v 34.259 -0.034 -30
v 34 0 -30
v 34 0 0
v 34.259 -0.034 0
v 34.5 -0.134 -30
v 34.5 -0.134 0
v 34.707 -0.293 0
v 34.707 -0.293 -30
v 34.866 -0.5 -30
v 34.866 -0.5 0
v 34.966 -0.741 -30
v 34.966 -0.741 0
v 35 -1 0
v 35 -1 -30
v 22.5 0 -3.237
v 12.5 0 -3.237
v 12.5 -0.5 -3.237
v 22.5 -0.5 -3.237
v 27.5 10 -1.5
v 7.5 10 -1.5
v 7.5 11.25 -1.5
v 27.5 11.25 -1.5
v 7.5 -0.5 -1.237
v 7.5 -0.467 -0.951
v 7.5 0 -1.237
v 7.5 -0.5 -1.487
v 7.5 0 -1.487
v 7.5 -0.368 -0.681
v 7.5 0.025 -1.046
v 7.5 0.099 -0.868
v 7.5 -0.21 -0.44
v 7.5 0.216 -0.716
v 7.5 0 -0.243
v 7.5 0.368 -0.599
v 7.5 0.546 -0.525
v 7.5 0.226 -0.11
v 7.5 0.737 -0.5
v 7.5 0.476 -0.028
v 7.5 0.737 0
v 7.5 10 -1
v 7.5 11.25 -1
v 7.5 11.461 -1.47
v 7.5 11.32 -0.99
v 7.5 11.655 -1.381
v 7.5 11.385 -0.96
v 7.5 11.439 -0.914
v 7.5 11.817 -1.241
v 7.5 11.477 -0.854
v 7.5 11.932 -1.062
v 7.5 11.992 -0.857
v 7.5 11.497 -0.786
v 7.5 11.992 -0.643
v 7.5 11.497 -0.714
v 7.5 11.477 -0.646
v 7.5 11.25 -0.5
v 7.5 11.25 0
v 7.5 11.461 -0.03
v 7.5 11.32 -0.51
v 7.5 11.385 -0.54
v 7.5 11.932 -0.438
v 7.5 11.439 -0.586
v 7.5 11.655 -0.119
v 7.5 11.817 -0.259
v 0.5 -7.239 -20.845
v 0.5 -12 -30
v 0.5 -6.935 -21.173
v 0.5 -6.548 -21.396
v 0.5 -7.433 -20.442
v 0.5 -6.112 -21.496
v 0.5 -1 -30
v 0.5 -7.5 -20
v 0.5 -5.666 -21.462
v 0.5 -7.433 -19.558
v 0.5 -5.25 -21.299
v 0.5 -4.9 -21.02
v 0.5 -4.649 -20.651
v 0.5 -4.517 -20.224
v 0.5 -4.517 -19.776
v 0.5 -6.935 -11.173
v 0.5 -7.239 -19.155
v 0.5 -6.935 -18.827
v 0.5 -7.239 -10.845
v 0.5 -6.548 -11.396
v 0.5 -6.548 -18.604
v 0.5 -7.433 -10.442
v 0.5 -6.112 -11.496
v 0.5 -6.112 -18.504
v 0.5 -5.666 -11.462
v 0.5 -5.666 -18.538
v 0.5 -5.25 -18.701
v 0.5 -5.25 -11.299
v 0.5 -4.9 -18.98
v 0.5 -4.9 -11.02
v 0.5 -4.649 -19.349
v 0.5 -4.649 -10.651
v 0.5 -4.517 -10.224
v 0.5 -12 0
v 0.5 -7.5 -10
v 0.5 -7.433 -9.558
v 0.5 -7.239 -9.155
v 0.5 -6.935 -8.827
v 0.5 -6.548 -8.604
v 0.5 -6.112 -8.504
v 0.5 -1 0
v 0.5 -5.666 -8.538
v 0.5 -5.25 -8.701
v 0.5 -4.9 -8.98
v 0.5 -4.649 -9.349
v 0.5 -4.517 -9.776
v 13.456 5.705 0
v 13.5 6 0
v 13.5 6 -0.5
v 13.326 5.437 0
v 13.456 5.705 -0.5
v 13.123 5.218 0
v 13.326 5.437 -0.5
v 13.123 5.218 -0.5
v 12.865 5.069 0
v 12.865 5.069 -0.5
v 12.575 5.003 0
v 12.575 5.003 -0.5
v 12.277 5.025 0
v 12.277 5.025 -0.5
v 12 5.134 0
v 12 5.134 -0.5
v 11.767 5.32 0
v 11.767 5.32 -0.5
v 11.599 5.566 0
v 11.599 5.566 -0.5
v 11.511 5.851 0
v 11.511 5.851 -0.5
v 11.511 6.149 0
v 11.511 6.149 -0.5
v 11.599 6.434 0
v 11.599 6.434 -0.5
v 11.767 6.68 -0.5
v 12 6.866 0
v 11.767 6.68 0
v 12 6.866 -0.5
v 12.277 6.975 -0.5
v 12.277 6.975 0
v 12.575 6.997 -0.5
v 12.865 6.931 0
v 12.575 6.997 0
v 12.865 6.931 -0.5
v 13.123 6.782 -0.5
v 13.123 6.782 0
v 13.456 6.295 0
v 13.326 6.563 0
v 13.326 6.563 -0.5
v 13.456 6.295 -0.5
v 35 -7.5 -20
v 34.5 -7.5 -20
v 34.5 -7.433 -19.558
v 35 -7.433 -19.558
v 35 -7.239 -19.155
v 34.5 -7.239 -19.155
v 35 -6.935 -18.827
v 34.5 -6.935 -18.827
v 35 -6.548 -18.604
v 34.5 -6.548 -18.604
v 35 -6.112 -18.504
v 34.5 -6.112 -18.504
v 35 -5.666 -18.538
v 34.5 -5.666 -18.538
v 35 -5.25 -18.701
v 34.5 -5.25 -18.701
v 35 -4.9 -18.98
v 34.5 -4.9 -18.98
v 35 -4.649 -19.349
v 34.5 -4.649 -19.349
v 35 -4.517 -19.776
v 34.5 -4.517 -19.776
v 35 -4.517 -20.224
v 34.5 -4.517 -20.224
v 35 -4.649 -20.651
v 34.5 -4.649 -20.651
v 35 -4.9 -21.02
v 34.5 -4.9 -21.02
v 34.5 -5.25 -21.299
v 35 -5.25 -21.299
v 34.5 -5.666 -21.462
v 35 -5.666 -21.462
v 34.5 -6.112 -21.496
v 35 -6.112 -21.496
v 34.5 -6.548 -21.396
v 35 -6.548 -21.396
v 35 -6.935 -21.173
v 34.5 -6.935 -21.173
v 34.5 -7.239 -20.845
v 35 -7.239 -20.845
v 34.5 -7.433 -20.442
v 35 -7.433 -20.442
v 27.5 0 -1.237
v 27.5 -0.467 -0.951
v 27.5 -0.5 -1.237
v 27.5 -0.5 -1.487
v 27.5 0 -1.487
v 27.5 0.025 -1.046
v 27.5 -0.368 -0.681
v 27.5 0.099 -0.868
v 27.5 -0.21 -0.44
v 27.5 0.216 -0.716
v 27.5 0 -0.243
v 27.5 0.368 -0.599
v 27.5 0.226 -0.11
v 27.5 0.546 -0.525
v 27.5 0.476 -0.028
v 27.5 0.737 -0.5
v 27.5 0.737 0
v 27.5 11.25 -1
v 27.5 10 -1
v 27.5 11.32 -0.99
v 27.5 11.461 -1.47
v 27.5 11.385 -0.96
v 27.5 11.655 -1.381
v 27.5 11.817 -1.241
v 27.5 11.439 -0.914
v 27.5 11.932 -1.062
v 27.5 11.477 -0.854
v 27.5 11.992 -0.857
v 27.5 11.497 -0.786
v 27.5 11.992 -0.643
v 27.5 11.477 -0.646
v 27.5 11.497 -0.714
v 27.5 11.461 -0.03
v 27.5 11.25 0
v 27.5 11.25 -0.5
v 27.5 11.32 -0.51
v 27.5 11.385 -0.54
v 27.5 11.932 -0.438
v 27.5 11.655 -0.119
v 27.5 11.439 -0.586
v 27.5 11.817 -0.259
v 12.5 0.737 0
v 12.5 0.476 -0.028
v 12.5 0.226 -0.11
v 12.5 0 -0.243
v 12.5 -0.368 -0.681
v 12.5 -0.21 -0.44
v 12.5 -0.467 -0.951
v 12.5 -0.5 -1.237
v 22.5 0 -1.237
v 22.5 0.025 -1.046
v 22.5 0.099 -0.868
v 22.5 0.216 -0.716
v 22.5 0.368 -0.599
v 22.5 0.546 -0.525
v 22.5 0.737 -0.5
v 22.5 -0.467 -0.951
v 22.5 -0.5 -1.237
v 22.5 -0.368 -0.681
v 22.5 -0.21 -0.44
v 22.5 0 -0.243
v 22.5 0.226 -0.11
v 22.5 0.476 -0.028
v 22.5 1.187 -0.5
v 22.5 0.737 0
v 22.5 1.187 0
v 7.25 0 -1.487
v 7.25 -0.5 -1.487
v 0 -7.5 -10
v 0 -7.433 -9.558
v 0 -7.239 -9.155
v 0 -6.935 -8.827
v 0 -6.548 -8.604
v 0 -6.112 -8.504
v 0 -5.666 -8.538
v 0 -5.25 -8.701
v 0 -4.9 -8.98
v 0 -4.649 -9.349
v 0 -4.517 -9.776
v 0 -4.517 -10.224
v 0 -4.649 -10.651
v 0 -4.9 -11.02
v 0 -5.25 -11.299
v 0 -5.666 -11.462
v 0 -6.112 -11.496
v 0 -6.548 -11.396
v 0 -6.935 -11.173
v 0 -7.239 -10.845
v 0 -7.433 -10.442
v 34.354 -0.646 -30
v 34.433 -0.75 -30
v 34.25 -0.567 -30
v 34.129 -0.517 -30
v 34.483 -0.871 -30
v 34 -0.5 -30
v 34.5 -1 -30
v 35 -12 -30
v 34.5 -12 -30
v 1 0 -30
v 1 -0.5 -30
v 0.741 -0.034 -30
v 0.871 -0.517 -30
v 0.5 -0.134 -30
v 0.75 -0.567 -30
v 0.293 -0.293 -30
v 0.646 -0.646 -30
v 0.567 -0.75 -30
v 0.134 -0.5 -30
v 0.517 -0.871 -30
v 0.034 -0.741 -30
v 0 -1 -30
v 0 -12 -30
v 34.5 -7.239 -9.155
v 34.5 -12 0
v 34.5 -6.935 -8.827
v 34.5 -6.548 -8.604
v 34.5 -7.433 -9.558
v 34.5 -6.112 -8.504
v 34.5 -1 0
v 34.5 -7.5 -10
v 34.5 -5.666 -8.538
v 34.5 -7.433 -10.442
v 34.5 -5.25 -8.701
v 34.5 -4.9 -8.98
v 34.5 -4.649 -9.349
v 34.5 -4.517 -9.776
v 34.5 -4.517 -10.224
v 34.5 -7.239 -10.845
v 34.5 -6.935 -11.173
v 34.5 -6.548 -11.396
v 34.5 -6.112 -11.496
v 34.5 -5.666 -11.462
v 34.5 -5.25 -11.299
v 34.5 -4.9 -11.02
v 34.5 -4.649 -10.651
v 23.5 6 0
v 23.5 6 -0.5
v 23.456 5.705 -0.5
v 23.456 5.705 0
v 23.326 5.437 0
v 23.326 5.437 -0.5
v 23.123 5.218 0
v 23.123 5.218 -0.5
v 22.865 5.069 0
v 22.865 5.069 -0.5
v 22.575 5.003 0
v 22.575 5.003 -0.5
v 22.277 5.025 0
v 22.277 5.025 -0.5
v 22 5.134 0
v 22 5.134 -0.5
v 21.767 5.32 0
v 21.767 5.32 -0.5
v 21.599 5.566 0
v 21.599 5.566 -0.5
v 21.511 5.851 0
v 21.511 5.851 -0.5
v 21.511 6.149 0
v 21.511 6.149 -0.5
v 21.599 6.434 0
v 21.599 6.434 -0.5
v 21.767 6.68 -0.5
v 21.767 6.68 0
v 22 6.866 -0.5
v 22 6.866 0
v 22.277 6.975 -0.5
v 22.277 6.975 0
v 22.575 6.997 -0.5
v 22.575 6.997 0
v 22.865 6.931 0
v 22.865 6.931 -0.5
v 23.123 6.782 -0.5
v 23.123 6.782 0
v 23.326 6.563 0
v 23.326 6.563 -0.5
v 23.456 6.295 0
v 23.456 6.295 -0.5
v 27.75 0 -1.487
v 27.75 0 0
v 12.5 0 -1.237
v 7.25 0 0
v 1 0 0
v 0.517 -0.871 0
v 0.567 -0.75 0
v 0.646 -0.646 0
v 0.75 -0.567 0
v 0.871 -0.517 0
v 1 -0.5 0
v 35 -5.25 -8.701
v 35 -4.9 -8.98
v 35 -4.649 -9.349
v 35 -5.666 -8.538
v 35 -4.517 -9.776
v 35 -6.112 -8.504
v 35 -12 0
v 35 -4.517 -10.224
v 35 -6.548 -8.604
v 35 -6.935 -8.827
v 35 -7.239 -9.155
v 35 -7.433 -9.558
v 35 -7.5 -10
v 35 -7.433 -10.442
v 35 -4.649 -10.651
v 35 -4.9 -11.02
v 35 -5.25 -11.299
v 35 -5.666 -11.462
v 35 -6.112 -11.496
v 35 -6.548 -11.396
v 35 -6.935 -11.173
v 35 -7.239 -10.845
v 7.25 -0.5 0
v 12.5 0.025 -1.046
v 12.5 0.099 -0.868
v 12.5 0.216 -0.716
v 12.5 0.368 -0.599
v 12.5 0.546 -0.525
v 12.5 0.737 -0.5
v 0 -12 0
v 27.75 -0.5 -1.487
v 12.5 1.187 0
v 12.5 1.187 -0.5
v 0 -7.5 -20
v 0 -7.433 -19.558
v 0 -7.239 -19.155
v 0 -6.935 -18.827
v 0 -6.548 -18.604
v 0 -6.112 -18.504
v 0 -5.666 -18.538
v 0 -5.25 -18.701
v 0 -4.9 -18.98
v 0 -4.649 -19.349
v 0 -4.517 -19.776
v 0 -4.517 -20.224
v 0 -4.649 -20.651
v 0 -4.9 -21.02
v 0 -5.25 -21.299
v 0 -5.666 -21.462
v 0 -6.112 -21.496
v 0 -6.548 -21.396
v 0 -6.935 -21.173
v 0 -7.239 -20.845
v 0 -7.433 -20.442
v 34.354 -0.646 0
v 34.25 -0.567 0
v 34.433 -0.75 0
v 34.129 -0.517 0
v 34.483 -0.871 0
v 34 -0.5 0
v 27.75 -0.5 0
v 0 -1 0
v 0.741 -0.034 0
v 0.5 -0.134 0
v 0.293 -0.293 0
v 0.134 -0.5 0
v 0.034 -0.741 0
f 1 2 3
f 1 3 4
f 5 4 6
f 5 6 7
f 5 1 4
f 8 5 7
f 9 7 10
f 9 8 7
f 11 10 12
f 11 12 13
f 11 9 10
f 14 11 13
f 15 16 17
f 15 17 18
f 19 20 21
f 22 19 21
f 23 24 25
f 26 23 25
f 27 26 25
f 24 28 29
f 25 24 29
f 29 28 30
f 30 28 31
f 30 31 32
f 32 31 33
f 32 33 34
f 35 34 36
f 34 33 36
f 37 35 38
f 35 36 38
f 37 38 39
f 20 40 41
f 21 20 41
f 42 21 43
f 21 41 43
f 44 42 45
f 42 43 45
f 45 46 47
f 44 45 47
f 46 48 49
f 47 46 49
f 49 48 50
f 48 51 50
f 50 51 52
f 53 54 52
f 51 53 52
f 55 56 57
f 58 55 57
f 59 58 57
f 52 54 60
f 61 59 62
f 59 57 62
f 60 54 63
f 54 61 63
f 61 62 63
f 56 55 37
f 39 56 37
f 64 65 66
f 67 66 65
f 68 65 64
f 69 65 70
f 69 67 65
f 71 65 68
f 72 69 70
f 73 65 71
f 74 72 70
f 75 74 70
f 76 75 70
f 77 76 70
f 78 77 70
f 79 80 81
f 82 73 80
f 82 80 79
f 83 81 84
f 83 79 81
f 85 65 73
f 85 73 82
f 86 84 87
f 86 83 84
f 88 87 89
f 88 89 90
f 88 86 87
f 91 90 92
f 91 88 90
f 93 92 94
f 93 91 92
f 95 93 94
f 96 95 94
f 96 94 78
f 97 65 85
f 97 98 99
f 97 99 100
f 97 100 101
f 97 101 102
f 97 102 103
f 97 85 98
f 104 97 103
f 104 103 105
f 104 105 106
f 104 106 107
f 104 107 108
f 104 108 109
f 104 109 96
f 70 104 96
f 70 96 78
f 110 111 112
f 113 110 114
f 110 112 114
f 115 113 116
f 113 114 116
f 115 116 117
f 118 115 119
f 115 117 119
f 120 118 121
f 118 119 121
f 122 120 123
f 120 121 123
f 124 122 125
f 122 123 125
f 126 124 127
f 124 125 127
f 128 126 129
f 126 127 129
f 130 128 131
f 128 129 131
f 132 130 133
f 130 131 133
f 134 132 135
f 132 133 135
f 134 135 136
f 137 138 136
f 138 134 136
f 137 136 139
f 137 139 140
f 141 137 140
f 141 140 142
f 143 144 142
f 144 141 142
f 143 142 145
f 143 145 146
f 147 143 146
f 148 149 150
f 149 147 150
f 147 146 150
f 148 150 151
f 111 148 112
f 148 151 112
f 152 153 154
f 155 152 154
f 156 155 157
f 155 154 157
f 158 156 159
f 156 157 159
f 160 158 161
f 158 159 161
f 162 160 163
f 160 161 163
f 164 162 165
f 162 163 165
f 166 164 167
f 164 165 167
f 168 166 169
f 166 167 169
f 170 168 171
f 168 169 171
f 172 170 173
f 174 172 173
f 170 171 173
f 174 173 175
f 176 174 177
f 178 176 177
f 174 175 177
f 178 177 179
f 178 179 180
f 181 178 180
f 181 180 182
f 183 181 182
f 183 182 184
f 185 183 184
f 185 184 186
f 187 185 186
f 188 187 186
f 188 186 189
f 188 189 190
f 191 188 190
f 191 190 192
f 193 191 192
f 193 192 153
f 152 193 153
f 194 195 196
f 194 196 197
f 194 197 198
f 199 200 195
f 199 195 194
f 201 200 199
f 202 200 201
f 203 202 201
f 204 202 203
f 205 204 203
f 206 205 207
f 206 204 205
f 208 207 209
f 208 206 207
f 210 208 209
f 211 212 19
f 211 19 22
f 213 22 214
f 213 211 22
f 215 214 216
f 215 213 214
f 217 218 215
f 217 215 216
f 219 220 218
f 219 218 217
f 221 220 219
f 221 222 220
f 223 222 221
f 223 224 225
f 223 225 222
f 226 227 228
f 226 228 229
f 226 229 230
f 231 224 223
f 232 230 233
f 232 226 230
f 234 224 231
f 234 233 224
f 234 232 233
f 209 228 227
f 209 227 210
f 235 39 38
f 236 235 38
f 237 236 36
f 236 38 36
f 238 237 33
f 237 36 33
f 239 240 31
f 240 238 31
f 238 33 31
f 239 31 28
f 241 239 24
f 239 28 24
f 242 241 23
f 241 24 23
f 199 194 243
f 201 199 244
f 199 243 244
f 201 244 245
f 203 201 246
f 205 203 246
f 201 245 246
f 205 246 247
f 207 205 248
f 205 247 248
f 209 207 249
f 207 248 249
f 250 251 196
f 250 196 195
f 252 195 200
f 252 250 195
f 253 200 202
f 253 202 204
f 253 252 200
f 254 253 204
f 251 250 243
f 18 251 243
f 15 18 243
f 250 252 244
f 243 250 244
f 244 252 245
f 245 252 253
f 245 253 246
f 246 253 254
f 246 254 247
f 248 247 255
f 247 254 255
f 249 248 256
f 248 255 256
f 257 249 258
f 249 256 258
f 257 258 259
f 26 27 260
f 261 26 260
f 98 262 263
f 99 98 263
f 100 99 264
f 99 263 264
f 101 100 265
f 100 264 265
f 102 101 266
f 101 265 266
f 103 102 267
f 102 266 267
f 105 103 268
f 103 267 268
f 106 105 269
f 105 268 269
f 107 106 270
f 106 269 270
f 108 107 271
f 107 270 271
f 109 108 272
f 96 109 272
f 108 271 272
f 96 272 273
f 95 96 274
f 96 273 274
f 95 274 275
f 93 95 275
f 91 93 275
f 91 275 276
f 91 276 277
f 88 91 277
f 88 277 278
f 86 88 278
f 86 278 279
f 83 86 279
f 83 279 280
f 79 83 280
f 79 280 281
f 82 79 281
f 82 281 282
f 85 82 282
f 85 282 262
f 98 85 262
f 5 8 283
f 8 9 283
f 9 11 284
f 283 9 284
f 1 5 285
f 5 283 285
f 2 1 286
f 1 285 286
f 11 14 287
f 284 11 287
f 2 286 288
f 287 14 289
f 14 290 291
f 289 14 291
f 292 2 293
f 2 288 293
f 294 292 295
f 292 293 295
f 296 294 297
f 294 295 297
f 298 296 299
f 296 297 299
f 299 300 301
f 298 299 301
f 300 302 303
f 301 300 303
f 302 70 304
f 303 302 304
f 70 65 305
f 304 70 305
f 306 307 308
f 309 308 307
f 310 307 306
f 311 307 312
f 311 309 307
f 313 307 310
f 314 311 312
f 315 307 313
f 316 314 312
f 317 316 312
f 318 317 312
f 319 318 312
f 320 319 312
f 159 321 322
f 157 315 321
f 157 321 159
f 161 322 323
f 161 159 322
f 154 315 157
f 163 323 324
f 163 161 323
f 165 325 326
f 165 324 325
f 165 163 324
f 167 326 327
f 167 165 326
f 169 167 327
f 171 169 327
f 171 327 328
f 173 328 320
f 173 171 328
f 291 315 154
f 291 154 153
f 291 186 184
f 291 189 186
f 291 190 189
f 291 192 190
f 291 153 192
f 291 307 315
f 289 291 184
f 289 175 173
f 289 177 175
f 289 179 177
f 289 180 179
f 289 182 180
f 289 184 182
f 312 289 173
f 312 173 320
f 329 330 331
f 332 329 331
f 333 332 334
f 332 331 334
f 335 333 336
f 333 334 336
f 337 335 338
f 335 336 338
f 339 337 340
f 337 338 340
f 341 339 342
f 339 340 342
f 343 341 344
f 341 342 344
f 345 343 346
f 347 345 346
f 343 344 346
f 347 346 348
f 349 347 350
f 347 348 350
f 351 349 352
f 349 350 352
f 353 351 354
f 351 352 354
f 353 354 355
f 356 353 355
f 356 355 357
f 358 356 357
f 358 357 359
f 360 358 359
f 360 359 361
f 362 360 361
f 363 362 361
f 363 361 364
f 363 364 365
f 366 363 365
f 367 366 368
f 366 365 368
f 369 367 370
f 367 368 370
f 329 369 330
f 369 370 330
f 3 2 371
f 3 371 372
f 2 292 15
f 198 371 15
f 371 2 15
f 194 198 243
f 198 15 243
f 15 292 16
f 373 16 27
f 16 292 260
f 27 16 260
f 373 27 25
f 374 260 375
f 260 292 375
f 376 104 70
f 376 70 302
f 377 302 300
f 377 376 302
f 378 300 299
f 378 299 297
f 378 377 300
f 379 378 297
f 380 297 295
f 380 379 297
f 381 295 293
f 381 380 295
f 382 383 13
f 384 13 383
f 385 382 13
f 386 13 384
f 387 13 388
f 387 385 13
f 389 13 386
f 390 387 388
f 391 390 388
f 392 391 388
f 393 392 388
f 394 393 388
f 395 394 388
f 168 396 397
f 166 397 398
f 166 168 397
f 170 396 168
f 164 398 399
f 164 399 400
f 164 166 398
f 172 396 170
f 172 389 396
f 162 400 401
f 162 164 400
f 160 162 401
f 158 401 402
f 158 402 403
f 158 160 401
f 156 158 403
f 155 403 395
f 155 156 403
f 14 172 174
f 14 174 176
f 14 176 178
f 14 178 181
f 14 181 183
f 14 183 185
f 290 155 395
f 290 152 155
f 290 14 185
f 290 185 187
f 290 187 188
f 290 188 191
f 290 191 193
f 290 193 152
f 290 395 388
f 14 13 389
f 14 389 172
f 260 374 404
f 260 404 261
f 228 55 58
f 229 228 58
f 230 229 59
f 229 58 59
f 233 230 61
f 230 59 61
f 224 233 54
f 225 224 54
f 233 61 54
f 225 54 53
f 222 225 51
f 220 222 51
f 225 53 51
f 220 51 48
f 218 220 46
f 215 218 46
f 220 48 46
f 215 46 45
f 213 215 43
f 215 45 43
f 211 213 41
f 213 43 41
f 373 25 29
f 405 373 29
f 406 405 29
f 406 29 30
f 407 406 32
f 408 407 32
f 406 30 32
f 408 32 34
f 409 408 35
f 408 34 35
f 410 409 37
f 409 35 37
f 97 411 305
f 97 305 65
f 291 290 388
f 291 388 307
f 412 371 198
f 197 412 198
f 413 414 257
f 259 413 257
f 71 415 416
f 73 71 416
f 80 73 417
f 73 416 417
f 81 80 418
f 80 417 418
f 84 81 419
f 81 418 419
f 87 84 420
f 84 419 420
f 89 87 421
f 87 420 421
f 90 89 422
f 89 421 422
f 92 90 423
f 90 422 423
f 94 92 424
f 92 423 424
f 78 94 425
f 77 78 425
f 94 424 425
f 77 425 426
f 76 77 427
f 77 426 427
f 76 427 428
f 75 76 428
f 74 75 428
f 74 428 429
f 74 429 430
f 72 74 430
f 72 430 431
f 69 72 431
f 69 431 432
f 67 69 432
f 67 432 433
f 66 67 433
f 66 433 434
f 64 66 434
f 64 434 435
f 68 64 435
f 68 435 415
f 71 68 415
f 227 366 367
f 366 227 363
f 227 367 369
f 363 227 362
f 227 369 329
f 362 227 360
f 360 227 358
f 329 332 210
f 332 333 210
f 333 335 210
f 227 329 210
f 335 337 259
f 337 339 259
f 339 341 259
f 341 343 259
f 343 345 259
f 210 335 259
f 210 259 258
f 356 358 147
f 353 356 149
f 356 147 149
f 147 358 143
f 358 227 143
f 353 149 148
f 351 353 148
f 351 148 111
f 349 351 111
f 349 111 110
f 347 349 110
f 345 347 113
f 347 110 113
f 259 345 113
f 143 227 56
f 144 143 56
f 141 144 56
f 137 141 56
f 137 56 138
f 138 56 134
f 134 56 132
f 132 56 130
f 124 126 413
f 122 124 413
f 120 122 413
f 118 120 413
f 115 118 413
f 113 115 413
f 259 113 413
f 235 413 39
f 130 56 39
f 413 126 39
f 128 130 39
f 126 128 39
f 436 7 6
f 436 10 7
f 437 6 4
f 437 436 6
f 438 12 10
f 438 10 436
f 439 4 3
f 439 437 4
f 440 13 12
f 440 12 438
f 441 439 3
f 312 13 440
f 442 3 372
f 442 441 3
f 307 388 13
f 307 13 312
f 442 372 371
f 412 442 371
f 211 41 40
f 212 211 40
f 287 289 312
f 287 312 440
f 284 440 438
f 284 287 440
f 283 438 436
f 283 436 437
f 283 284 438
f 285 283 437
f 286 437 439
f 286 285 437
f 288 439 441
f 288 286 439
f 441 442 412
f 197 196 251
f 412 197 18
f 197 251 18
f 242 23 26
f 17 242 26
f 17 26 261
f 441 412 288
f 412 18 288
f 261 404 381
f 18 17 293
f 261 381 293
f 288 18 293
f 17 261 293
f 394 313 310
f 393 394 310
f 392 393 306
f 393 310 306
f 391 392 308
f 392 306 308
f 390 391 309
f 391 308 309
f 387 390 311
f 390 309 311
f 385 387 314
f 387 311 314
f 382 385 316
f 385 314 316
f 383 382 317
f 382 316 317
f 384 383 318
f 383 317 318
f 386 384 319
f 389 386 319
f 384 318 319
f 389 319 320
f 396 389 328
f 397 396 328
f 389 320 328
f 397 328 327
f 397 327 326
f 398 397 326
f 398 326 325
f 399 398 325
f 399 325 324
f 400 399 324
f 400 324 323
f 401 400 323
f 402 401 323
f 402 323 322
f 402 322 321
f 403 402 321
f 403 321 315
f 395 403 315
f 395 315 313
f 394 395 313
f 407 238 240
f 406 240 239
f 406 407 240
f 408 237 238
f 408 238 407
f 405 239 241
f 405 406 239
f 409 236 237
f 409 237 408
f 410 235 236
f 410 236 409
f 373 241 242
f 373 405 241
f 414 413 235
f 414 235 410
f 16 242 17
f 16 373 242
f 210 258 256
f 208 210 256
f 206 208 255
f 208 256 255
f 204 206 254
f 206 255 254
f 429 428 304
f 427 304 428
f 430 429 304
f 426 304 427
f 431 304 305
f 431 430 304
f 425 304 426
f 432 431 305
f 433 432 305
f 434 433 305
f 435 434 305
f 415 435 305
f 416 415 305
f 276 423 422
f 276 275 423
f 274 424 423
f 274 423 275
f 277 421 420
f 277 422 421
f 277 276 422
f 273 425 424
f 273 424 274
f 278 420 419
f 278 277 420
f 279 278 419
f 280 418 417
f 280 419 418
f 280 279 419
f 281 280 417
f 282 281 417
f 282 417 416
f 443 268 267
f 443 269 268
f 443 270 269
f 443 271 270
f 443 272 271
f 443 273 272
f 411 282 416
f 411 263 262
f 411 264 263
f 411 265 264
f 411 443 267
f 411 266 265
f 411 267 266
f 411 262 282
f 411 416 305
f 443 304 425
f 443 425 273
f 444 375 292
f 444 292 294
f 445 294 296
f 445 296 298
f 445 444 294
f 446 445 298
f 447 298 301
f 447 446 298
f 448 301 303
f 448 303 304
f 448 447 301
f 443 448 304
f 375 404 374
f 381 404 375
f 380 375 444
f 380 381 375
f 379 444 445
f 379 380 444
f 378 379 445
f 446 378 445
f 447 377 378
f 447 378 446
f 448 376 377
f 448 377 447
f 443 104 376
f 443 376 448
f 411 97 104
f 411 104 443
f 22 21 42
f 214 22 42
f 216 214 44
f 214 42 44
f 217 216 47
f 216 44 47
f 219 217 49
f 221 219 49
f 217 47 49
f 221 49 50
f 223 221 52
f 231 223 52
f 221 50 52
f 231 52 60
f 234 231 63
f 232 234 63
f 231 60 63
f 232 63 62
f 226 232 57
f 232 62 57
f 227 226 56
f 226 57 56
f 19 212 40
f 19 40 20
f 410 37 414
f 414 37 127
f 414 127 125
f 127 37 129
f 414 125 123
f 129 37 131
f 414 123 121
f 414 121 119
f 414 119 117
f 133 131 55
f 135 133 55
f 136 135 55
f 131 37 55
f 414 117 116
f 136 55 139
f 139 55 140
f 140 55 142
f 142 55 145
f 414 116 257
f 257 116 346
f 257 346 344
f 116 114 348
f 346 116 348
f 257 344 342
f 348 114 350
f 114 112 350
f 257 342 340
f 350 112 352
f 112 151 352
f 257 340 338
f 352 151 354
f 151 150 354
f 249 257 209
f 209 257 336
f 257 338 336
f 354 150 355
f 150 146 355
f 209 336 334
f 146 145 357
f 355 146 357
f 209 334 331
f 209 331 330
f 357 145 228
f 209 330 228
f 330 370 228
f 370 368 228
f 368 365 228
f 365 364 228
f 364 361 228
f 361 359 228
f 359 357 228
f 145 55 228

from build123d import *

# Parameters (mm, degrees)
SKETCH1_W                     = 35
SKETCH1_H                     = 30
BASE_FLANGE1_DEPTH            = 0.5
EDGE_FLANGE1_STRIP_W          = 3
EDGE_FLANGE1_STRIP_H          = 0.5
EDGE_FLANGE1_STRIP_CUT_DEPTH  = 30
EDGE_FLANGE1_DEPTH            = 30
EDGE_FLANGE2_STRIP_W          = 3
EDGE_FLANGE2_STRIP_H          = 0.5
EDGE_FLANGE2_STRIP_CUT_DEPTH  = 30
EDGE_FLANGE2_DEPTH            = 30
SKETCH12_R                    = 1.5
CUT_EXTRUDE1_DEPTH            = 40
EDGE_FLANGE4_STRIP_W          = 3.4732
EDGE_FLANGE4_STRIP_H          = 0.5
EDGE_FLANGE4_STRIP_CUT_DEPTH  = 20
EDGE_FLANGE4_RELIEF_W         = 3.7232
EDGE_FLANGE4_RELIEF_H         = 0.25
EDGE_FLANGE4_RELIEF_CUT_DEPTH = 0.5
EDGE_FLANGE4_DEPTH            = 20
SKETCH25_R                    = 1
CUT_EXTRUDE2_DEPTH            = 0.5
HEM1_START                    = 7.5
HEM1_DEPTH                    = 20
HEM1_2_DEPTH                  = 20
UNFOLD1_OUTLINE_W             = 20
UNFOLD1_OUTLINE_H             = 1.5
UNFOLD1_DEPTH                 = 13
UNFOLD1_START                 = -0.5
UNFOLD1_2_OUTLINE_W           = 20
UNFOLD1_2_OUTLINE_H           = 11.076547656
UNFOLD1_2_OUTLINE_R           = 1
UNFOLD1_2_DEPTH               = 0.5
UNFOLD1_START_2               = 7.5
UNFOLD1_3_DEPTH               = 20
SKETCH30_W                    = 10
SKETCH30_H                    = 4
CUT_EXTRUDE3_DEPTH            = 0.5
FOLD1_START                   = 7.5
FOLD1_DEPTH                   = 20
FOLD1_START_2                 = 13.5000001
FOLD1_2_DEPTH                 = 7.9999998
FOLD1_3_DEPTH                 = 3.9999999
FOLD1_START_3                 = 23.5000001
FOLD1_4_DEPTH                 = 3.9999999
FOLD1_5_DEPTH                 = 5
FOLD1_START_4                 = 22.5
FOLD1_6_DEPTH                 = 5
FOLD1_START_5                 = -0.5
FOLD1_7_DEPTH                 = 0.5
FOLD1_START_6                 = 11.4999999
FOLD1_8_DEPTH                 = 12.0000002


with BuildPart() as part:
    # Base-Flange1: sheet metal written as solids
    # Sketch1 → Base-Flange1 (new body)
    with BuildSketch(Plane(origin=(0, 0, 0), x_dir=(1, 0, 0), z_dir=(0, 1, 0))):
        with Locations((17.5, 15)):
            Rectangle(SKETCH1_W, SKETCH1_H)
    extrude(amount=-BASE_FLANGE1_DEPTH)

    # Edge-Flange1: sheet metal written as solids
    # Edge-Flange1 strip (on a plane across the edge) → Edge-Flange1 strip cut (cut)
    with BuildSketch(Plane(origin=(35, -0.5, -30), x_dir=(-1, 0, 0), z_dir=(0, 0, 1))):
        with Locations((-0.5, -0.25)):
            Rectangle(EDGE_FLANGE1_STRIP_W, EDGE_FLANGE1_STRIP_H)
    extrude(amount=EDGE_FLANGE1_STRIP_CUT_DEPTH, mode=Mode.SUBTRACT)

    # Edge-Flange1 section (on a plane across the edge) → Edge-Flange1 (add)
    with BuildSketch(Plane(origin=(35, -0.5, -30), x_dir=(-1, 0, 0), z_dir=(0, 0, 1))):
        with BuildLine():
            Line((0, 0.5), (0, 11.5))
            Line((0, 11.5), (0.5, 11.5))
            Line((0.5, 11.5), (0.5, 0.5))
            ThreePointArc((0.5, 0.5), (0.646446609, 0.146446609), (1, 0))
            Line((1, 0), (1, -0.5))
            ThreePointArc((1, -0.5), (0.292893219, -0.207106781), (0, 0.5))
        make_face()
    extrude(amount=EDGE_FLANGE1_DEPTH)

    # Edge-Flange2: sheet metal written as solids
    # Edge-Flange2 strip (on a plane across the edge) → Edge-Flange2 strip cut (cut)
    with BuildSketch(Plane(origin=(0, -0.5, 0), x_dir=(1, 0, 0), z_dir=(0, 0, -1))):
        with Locations((-0.5, -0.25)):
            Rectangle(EDGE_FLANGE2_STRIP_W, EDGE_FLANGE2_STRIP_H)
    extrude(amount=EDGE_FLANGE2_STRIP_CUT_DEPTH, mode=Mode.SUBTRACT)

    # Edge-Flange2 section (on a plane across the edge) → Edge-Flange2 (add)
    with BuildSketch(Plane(origin=(0, -0.5, 0), x_dir=(1, 0, 0), z_dir=(0, 0, -1))):
        with BuildLine():
            Line((0, 0.5), (0, 11.5))
            Line((0, 11.5), (0.5, 11.5))
            Line((0.5, 11.5), (0.5, 0.5))
            ThreePointArc((0.5, 0.5), (0.646446609, 0.146446609), (1, 0))
            Line((1, 0), (1, -0.5))
            ThreePointArc((1, -0.5), (0.292893219, -0.207106781), (0, 0.5))
        make_face()
    extrude(amount=EDGE_FLANGE2_DEPTH)

    # Sketch12 → Cut-Extrude1 (cut)
    with BuildSketch(Plane.ZY):
        with Locations(Location((-20, -6, 0), (0, 0, 270))):
            Circle(SKETCH12_R)
        with Locations(Location((-10, -6, 0), (0, 0, 270))):
            Circle(SKETCH12_R)
    extrude(amount=-CUT_EXTRUDE1_DEPTH, mode=Mode.SUBTRACT)

    # Edge-Flange4: sheet metal written as solids
    # Edge-Flange4 strip (on a plane across the edge) → Edge-Flange4 strip cut (cut)
    with BuildSketch(Plane(origin=(7.5, 0, 0), x_dir=(0, 0, -1), z_dir=(1, 0, 0))):
        with Locations((-0.5, -0.25)):
            Rectangle(EDGE_FLANGE4_STRIP_W, EDGE_FLANGE4_STRIP_H)
    extrude(amount=EDGE_FLANGE4_STRIP_CUT_DEPTH, mode=Mode.SUBTRACT)

    # Edge-Flange4 relief (on the sheet) → Edge-Flange4 relief cut (cut)
    with BuildSketch(Plane(origin=(7.5, 0, -1.2366), x_dir=(0, 0, -1), z_dir=(0, 1, 0))):
        with Locations((-1.6116, 0.125)):
            Rectangle(EDGE_FLANGE4_RELIEF_W, EDGE_FLANGE4_RELIEF_H)
        with Locations((-1.6116, -20.125)):
            Rectangle(EDGE_FLANGE4_RELIEF_W, EDGE_FLANGE4_RELIEF_H)
    extrude(amount=-EDGE_FLANGE4_RELIEF_CUT_DEPTH, mode=Mode.SUBTRACT)

    # Edge-Flange4 section (on a plane across the edge) → Edge-Flange4 (add)
    with BuildSketch(Plane(origin=(7.5, 0, 0), x_dir=(0, 0, -1), z_dir=(1, 0, 0))):
        with BuildLine():
            Line((0, 0.7366), (0, 12))
            Line((0, 12), (0.5, 12))
            Line((0.5, 12), (0.5, 0.7366))
            ThreePointArc((0.5, 0.7366), (0.715745145, 0.215745145), (1.2366, 0))
            Line((1.2366, 0), (1.2366, -0.5))
            ThreePointArc((1.2366, -0.5), (0.362191754, -0.137808246), (0, 0.7366))
        make_face()
    extrude(amount=EDGE_FLANGE4_DEPTH)

    # Sketch25 → Cut-Extrude2 (cut)
    with BuildSketch(Plane.XY):
        with Locations((12.5, 6)):
            Circle(SKETCH25_R)
        with Locations(Location((22.5, 6, 0), (0, 0, 180))):
            Circle(SKETCH25_R)
    extrude(amount=-CUT_EXTRUDE2_DEPTH, mode=Mode.SUBTRACT)

    # Hem1: read off the stored shape, not the designer's step
    # Hem1 outline → Hem1 (cut)
    with BuildSketch(Plane.YZ.offset(HEM1_START)):
        with BuildLine():
            ThreePointArc((11.25, 0), (11.683012702, -0.137627564), (11.957106781, -0.5))
            Line((11.957106781, -0.5), (12, -0.5))
            Line((12, -0.5), (12, 0))
            Line((12, 0), (11.25, 0))
        make_face()
    extrude(amount=HEM1_DEPTH, mode=Mode.SUBTRACT)

    # Hem1 2 outline → Hem1 2 (add)
    with BuildSketch(Plane.YZ.offset(HEM1_START)):
        with BuildLine():
            Line((10, -1), (10, -1.5))
            Line((10, -1.5), (11.25, -1.5))
            ThreePointArc((11.25, -1.5), (11.862372436, -1.183012702), (11.957106781, -0.5))
            Line((11.957106781, -0.5), (11.25, -0.5))
            ThreePointArc((11.25, -0.5), (11.5, -0.75), (11.25, -1))
            Line((11.25, -1), (10, -1))
        make_face()
    extrude(amount=HEM1_2_DEPTH)

    # Unfold1: read off the stored shape, not the designer's step
    # Unfold1 outline → Unfold1 (cut)
    with BuildSketch(Plane(origin=(0, 0, 0), x_dir=(1, 0, 0), z_dir=(0, 1, 0))):
        with Locations((17.5, 0.75)):
            Rectangle(UNFOLD1_OUTLINE_W, UNFOLD1_OUTLINE_H)
    extrude(amount=UNFOLD1_DEPTH, mode=Mode.SUBTRACT)

    # Unfold1 2 outline → Unfold1 2 (add)
    with BuildSketch(Plane(origin=(0, 0, 0), x_dir=(1, 0, 0), z_dir=(0, 1, 0)).offset(UNFOLD1_START)):
        with Locations((17.5, -4.038273828)):
            Rectangle(UNFOLD1_2_OUTLINE_W, UNFOLD1_2_OUTLINE_H)
        with Locations((12.5, -5.576547656)):
            Circle(UNFOLD1_2_OUTLINE_R, mode=Mode.SUBTRACT)
        with Locations((22.5, -5.576547656)):
            Circle(UNFOLD1_2_OUTLINE_R, mode=Mode.SUBTRACT)
    extrude(amount=UNFOLD1_2_DEPTH)

    # Unfold1 3 outline → Unfold1 3 (add)
    with BuildSketch(Plane.YZ.offset(UNFOLD1_START_2)):
        with BuildLine():
            Line((-0.5, 10.826547656), (-0.5, 9.576547656))
            Line((-0.5, 9.576547656), (0, 9.576547656))
            Line((0, 9.576547656), (0, 10.826547656))
            ThreePointArc((0, 10.826547656), (0.25, 11.076547656), (0.5, 10.826547656))
            Line((0.5, 10.826547656), (0.5, 9.576547656))
            Line((0.5, 9.576547656), (1, 9.576547656))
            Line((1, 9.576547656), (1, 10.826547656))
            ThreePointArc((1, 10.826547656), (0.25, 11.576547656), (-0.5, 10.826547656))
        make_face()
    extrude(amount=UNFOLD1_3_DEPTH)

    # Sketch30 → Cut-Extrude3 (cut)
    with BuildSketch(Plane(origin=(0, 0, 0), x_dir=(1, 0, 0), z_dir=(0, 1, 0))):
        with Locations((17.5, 1.2366)):
            Rectangle(SKETCH30_W, SKETCH30_H)
    extrude(amount=-CUT_EXTRUDE3_DEPTH, mode=Mode.SUBTRACT)

    # Fold1: read off the stored shape, not the designer's step
    # Fold1 outline → Fold1 (cut)
    with BuildSketch(Plane.YZ.offset(FOLD1_START)):
        with BuildLine():
            ThreePointArc((-0.5, -1.2366), (-0.367949483, -0.68058741), (0, -0.243322596))
            Line((0, -0.243322596), (0, 10.826547656))
            ThreePointArc((0, 10.826547656), (0.25, 11.076547656), (0.5, 10.826547656))
            Line((0.5, 10.826547656), (0.5, 9.576547656))
            Line((0.5, 9.576547656), (1, 9.576547656))
            Line((1, 9.576547656), (1, 10.826547656))
            ThreePointArc((1, 10.826547656), (0.25, 11.576547656), (-0.5, 10.826547656))
            Line((-0.5, 10.826547656), (-0.5, -1.2366))
        make_face()
    extrude(amount=FOLD1_DEPTH, mode=Mode.SUBTRACT)

    # Fold1 3 outline → Fold1 3 (add)
    with BuildSketch(Plane.YZ.offset(FOLD1_START)):
        with BuildLine():
            ThreePointArc((0.7366, 0), (0.348725843, -0.062405298), (0, -0.243322596))
            Line((0, -0.243322596), (0, -1.2366))
            ThreePointArc((0, -1.2366), (0.215745145, -0.715745145), (0.7366, -0.5))
            Line((0.7366, -0.5), (11.25, -0.5))
            ThreePointArc((11.25, -0.5), (11.5, -0.75), (11.25, -1))
            Line((11.25, -1), (10, -1))
            Line((10, -1), (10, -1.5))
            Line((10, -1.5), (11.25, -1.5))
            ThreePointArc((11.25, -1.5), (12, -0.75), (11.25, 0))
            Line((11.25, 0), (0.7366, 0))
        make_face()
    extrude(amount=FOLD1_3_DEPTH)

    # Fold1 4 outline → Fold1 4 (add)
    with BuildSketch(Plane.YZ.offset(FOLD1_START_3)):
        with BuildLine():
            ThreePointArc((0.7366, 0), (0.348725843, -0.062405298), (0, -0.243322596))
            Line((0, -0.243322596), (0, -1.2366))
            ThreePointArc((0, -1.2366), (0.215745145, -0.715745145), (0.7366, -0.5))
            Line((0.7366, -0.5), (11.25, -0.5))
            ThreePointArc((11.25, -0.5), (11.5, -0.75), (11.25, -1))
            Line((11.25, -1), (10, -1))
            Line((10, -1), (10, -1.5))
            Line((10, -1.5), (11.25, -1.5))
            ThreePointArc((11.25, -1.5), (12, -0.75), (11.25, 0))
            Line((11.25, 0), (0.7366, 0))
        make_face()
    extrude(amount=FOLD1_4_DEPTH)

    # Fold1 5 outline → Fold1 5 (add)
    with BuildSketch(Plane.YZ.offset(FOLD1_START)):
        with BuildLine():
            Line((1.186852344, 0), (0.7366, 0))
            ThreePointArc((0.7366, 0), (0.348725843, -0.062405298), (0, -0.243322596))
            Line((0, -0.243322596), (0, -1.2366))
            ThreePointArc((0, -1.2366), (0.215745145, -0.715745145), (0.7366, -0.5))
            Line((0.7366, -0.5), (1.186852344, -0.5))
            Line((1.186852344, -0.5), (1.186852344, 0))
        make_face()
    extrude(amount=FOLD1_5_DEPTH)

    # Fold1 6 outline → Fold1 6 (add)
    with BuildSketch(Plane.YZ.offset(FOLD1_START_4)):
        with BuildLine():
            Line((1.186852344, 0), (0.7366, 0))
            ThreePointArc((0.7366, 0), (0.348725843, -0.062405298), (0, -0.243322596))
            Line((0, -0.243322596), (0, -1.2366))
            ThreePointArc((0, -1.2366), (0.215745145, -0.715745145), (0.7366, -0.5))
            Line((0.7366, -0.5), (1.186852344, -0.5))
            Line((1.186852344, -0.5), (1.186852344, 0))
        make_face()
    extrude(amount=FOLD1_6_DEPTH)



with BuildPart() as body_2:
    # Fold1 2 outline → Fold1 2 (new body)
    with BuildSketch(Plane.YZ.offset(FOLD1_START_2)):
        with BuildLine():
            Line((11.25, 0), (1.186852344, 0))
            Line((1.186852344, 0), (1.186852344, -0.5))
            Line((1.186852344, -0.5), (11.25, -0.5))
            ThreePointArc((11.25, -0.5), (11.5, -0.75), (11.25, -1))
            Line((11.25, -1), (10, -1))
            Line((10, -1), (10, -1.5))
            Line((10, -1.5), (11.25, -1.5))
            ThreePointArc((11.25, -1.5), (12, -0.75), (11.25, 0))
        make_face()
    extrude(amount=FOLD1_2_DEPTH)


with BuildPart() as part_1:
    add(part.part)

    add(body_2.part)  # Fold1 7 merges body 2
    # Fold1 7 outline → Fold1 7 (add)
    with BuildSketch(Plane.XY.offset(FOLD1_START_5)):
        with BuildLine():
            Line((13.5000001, 1.186852344), (13.5, 6))
            ThreePointArc((13.5, 6), (12.5, 5), (11.5, 6))
            Line((11.5, 6), (11.4999999, 1.186852344))
            Line((11.4999999, 1.186852344), (13.5000001, 1.186852344))
        make_face()
        with BuildLine():
            ThreePointArc((11.5, 6), (12.5, 7), (13.5, 6))
            Line((13.5, 6), (13.5000001, 10))
            Line((13.5000001, 10), (11.4999999, 10))
            Line((11.4999999, 10), (11.5, 6))
        make_face()
        with BuildLine():
            Line((21.5, 6), (21.4999999, 1.186852344))
            Line((21.4999999, 1.186852344), (23.5000001, 1.186852344))
            Line((23.5000001, 1.186852344), (23.5, 6))
            ThreePointArc((23.5, 6), (22.5, 5), (21.5, 6))
        make_face()
        with BuildLine():
            Line((23.5000001, 10), (21.4999999, 10))
            Line((21.4999999, 10), (21.5, 6))
            ThreePointArc((21.5, 6), (22.5, 7), (23.5, 6))
            Line((23.5, 6), (23.5000001, 10))
        make_face()
    extrude(amount=FOLD1_7_DEPTH)

    # Fold1 8 outline → Fold1 8 (add)
    with BuildSketch(Plane.YZ.offset(FOLD1_START_6)):
        with BuildLine():
            Line((11.25, 0), (10, 0))
            Line((10, 0), (10, -0.5))
            Line((10, -0.5), (11.25, -0.5))
            ThreePointArc((11.25, -0.5), (11.5, -0.75), (11.25, -1))
            Line((11.25, -1), (10, -1))
            Line((10, -1), (10, -1.5))
            Line((10, -1.5), (11.25, -1.5))
            ThreePointArc((11.25, -1.5), (12, -0.75), (11.25, 0))
        make_face()
    extrude(amount=FOLD1_8_DEPTH)


solid = part_1.part
